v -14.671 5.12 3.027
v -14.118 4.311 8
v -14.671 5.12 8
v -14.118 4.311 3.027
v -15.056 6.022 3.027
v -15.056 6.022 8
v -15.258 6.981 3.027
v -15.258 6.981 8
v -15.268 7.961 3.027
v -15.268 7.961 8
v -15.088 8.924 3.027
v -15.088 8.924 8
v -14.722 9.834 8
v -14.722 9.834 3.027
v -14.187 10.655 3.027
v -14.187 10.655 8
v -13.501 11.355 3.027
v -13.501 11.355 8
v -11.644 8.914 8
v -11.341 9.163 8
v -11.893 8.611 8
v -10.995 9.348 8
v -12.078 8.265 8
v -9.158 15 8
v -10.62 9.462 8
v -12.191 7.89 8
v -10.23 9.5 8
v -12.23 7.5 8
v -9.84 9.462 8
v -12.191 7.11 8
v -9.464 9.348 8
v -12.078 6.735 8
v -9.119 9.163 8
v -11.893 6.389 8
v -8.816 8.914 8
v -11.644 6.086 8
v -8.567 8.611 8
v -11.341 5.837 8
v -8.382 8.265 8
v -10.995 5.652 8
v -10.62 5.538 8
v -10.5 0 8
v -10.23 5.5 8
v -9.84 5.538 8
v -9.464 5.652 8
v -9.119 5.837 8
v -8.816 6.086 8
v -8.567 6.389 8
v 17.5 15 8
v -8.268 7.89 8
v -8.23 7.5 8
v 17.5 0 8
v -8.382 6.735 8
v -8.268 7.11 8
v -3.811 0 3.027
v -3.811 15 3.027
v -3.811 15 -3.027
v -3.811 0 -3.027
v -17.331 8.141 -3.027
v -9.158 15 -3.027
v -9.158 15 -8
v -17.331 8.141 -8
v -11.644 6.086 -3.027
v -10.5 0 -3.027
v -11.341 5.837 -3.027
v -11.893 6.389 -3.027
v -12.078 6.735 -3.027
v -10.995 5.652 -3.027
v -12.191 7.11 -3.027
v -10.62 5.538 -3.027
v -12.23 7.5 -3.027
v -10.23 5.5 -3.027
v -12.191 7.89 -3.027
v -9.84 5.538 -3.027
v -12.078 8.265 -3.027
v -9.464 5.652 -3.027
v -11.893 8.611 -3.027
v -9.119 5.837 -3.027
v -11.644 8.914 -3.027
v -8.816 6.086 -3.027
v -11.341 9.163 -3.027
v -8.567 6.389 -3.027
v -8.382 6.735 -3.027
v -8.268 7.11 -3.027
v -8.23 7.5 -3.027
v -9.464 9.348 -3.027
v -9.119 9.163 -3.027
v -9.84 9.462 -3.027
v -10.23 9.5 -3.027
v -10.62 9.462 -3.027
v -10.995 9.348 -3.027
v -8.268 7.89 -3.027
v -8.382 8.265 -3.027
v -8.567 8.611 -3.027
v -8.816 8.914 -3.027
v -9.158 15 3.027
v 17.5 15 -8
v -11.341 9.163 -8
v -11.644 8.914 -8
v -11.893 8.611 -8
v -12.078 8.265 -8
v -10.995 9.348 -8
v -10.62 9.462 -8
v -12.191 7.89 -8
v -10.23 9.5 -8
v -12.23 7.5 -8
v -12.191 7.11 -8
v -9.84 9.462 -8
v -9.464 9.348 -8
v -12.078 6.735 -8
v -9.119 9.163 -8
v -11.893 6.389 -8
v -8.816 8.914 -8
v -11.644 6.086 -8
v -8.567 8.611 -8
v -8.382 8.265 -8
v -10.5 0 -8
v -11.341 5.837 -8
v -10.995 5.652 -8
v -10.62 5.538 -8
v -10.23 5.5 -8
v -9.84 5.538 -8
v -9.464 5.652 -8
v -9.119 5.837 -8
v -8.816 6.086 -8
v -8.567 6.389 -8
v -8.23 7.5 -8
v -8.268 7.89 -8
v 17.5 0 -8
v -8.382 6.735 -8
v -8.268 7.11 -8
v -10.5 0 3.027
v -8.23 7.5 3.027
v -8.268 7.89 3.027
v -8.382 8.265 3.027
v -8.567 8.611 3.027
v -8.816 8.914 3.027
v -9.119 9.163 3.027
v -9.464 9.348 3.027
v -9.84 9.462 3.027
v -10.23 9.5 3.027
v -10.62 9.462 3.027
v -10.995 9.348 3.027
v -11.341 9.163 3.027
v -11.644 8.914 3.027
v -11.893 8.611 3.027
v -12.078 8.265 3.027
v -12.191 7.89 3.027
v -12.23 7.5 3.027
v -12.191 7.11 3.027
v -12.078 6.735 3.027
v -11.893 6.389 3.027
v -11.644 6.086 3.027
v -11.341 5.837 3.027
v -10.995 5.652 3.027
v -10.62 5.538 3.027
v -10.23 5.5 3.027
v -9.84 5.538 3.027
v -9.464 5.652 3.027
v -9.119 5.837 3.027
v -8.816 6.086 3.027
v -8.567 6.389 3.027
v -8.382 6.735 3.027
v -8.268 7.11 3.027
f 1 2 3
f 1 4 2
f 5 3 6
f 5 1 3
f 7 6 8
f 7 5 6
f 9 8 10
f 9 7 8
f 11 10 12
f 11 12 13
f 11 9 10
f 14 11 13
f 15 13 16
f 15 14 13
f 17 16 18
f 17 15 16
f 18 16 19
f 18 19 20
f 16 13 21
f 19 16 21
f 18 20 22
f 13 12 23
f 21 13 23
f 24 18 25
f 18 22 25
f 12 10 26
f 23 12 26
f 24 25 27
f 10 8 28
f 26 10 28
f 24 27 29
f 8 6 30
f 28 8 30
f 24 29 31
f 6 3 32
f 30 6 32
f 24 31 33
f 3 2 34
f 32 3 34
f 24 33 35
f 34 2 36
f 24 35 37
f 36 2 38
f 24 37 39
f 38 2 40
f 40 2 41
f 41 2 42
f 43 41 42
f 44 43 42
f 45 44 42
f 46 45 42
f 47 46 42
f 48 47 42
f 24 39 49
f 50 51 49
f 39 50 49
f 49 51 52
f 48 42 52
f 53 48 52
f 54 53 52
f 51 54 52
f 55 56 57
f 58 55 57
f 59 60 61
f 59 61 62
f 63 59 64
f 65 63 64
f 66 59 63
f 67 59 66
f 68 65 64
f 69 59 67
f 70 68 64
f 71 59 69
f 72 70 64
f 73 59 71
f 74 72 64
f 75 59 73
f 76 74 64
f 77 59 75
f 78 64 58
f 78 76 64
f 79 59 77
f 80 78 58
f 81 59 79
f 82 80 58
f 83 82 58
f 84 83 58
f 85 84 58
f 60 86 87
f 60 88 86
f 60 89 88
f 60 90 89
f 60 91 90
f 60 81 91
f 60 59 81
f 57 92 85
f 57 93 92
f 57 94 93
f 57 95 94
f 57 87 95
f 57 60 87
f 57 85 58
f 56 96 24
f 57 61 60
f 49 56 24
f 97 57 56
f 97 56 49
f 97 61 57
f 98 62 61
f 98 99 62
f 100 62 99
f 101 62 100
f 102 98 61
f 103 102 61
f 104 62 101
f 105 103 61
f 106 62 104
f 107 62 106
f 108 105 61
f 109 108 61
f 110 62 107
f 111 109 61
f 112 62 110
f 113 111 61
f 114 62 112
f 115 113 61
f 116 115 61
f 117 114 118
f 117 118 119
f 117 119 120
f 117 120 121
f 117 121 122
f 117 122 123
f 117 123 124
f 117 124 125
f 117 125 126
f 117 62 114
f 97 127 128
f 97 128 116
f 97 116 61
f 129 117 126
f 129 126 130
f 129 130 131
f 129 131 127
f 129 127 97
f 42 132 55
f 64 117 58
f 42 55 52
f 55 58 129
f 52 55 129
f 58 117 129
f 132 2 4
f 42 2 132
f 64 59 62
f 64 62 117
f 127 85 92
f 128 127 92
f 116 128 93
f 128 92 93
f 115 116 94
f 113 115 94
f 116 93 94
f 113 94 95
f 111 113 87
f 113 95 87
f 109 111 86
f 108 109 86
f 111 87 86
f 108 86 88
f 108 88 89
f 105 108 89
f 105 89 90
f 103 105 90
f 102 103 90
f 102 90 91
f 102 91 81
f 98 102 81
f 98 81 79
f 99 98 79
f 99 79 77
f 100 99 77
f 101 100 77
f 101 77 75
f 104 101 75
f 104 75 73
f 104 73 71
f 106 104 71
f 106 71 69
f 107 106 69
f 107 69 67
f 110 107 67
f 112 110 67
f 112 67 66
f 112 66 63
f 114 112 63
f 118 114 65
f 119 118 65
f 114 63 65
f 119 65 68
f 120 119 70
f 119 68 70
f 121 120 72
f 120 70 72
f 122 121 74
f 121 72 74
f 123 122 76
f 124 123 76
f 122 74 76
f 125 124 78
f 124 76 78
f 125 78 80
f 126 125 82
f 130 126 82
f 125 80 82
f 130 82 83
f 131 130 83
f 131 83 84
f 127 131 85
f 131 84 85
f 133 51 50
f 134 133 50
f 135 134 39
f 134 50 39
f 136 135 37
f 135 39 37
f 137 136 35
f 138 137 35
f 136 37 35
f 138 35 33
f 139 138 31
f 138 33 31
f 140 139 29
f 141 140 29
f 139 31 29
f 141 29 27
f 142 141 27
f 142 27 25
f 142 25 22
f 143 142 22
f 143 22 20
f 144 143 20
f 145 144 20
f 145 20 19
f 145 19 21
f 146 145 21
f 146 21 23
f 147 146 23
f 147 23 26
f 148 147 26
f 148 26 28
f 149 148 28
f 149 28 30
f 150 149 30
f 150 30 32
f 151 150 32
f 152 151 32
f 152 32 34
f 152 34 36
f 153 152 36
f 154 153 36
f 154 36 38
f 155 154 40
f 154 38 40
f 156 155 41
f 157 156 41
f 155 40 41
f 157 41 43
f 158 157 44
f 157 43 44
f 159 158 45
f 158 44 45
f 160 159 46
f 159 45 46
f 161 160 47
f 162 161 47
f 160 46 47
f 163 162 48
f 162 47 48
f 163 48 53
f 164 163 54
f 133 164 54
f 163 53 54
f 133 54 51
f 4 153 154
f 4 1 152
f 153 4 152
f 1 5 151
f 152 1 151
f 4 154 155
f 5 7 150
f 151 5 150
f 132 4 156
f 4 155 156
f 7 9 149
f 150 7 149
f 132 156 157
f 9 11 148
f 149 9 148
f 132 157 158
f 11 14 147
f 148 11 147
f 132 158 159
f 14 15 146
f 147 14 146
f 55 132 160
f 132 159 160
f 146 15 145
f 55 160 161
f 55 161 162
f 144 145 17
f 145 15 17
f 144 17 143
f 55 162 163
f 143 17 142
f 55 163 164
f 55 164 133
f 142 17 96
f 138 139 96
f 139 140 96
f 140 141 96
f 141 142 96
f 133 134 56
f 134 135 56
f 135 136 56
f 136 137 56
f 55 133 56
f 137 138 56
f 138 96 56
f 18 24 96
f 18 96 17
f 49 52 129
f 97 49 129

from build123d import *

# Parameters (mm, degrees)
SKETCH_1_W          = 35
SKETCH_1_H          = 16
EXTRUDE_1_DEPTH     = 15
SKETCH_2_W          = 27.377038818
SKETCH_2_H          = 6.053774878
CUT_EXTRUDE_2_DEPTH = 25.397745798
SKETCH_3_R          = 2
CUT_EXTRUDE_3_DEPTH = 29.057975693
CHAMFER_1_SIZE      = 8.342275148
CHAMFER_1_SIZE_2    = 7
FILLET_1_R          = 5


with BuildPart() as part:
    # Эскиз1 → Вытянуть1 (new body)
    with BuildSketch(Plane(origin=(0, 0, 0), x_dir=(1, 0, 0), z_dir=(0, 1, 0))):
        Rectangle(SKETCH_1_W, SKETCH_1_H)
    extrude(amount=EXTRUDE_1_DEPTH)

    # Эскиз2 → Вытянуть2 (cut, through all)
    with BuildSketch(Plane(origin=(0, 15, 0), x_dir=(1, 0, 0), z_dir=(0, 1, 0))):
        with Locations((-17.5, 0)):
            Rectangle(SKETCH_2_W, SKETCH_2_H)
    extrude(amount=-CUT_EXTRUDE_2_DEPTH, mode=Mode.SUBTRACT)

    # Эскиз3 → Вытянуть3 (cut, through all)
    with BuildSketch(Plane.XY.offset(8)):
        with Locations((-10.229823295, 7.5)):
            Circle(SKETCH_3_R)
    extrude(amount=-CUT_EXTRUDE_3_DEPTH, mode=Mode.SUBTRACT)

    # Фаска1
    # the kernel refuses this chamfer: 8.342275148, 7 mm, written as the material it takes off along each edge
    with BuildSketch(Plane(origin=(-17.5, 0, 18.474543444), x_dir=(-0.024939322090234327, 0.9996889667359942, 0), z_dir=(0, 0, -1)), Plane(origin=(-17.5, 15, 29.501430883), x_dir=(0.9996889667359942, 0.024939322090234327, 0), z_dir=(0, 0, -1))) as chamfer_1_piece_1:
        Polygon((CHAMFER_1_SIZE * 0.999688966755, CHAMFER_1_SIZE * 0.0249393220907), (-CHAMFER_1_SIZE_2 * 0.0249393220902, CHAMFER_1_SIZE_2 * 0.999688966736), (0, 0), align=None)
    extrude(amount=47.975974327, mode=Mode.SUBTRACT)
    with BuildSketch(Plane(origin=(-17.5, 0, 29.501430883), x_dir=(0.9993728857116146, -0.03540953691366304, 0), z_dir=(0, 0, -1)), Plane(origin=(-17.5, 15, 18.474543444), x_dir=(-0.035409536913663095, -0.9993728857116146, 0), z_dir=(0, 0, -1))) as chamfer_1_piece_2:
        Polygon((CHAMFER_1_SIZE_2 * 0.999372885712, -CHAMFER_1_SIZE_2 * 0.0354095369137), (-CHAMFER_1_SIZE * 0.0354095369143, -CHAMFER_1_SIZE * 0.999372885731), (0, 0), align=None)
    extrude(amount=47.975974327, mode=Mode.SUBTRACT)

    # Скругление1
    fillet_1_edges = [part.edges().sort_by_distance(p)[0] for p in [
        (-17.33146239, 8.141419846, 5.513443719),
    ]]
    fillet(fillet_1_edges, radius=FILLET_1_R)


solid = part.part
